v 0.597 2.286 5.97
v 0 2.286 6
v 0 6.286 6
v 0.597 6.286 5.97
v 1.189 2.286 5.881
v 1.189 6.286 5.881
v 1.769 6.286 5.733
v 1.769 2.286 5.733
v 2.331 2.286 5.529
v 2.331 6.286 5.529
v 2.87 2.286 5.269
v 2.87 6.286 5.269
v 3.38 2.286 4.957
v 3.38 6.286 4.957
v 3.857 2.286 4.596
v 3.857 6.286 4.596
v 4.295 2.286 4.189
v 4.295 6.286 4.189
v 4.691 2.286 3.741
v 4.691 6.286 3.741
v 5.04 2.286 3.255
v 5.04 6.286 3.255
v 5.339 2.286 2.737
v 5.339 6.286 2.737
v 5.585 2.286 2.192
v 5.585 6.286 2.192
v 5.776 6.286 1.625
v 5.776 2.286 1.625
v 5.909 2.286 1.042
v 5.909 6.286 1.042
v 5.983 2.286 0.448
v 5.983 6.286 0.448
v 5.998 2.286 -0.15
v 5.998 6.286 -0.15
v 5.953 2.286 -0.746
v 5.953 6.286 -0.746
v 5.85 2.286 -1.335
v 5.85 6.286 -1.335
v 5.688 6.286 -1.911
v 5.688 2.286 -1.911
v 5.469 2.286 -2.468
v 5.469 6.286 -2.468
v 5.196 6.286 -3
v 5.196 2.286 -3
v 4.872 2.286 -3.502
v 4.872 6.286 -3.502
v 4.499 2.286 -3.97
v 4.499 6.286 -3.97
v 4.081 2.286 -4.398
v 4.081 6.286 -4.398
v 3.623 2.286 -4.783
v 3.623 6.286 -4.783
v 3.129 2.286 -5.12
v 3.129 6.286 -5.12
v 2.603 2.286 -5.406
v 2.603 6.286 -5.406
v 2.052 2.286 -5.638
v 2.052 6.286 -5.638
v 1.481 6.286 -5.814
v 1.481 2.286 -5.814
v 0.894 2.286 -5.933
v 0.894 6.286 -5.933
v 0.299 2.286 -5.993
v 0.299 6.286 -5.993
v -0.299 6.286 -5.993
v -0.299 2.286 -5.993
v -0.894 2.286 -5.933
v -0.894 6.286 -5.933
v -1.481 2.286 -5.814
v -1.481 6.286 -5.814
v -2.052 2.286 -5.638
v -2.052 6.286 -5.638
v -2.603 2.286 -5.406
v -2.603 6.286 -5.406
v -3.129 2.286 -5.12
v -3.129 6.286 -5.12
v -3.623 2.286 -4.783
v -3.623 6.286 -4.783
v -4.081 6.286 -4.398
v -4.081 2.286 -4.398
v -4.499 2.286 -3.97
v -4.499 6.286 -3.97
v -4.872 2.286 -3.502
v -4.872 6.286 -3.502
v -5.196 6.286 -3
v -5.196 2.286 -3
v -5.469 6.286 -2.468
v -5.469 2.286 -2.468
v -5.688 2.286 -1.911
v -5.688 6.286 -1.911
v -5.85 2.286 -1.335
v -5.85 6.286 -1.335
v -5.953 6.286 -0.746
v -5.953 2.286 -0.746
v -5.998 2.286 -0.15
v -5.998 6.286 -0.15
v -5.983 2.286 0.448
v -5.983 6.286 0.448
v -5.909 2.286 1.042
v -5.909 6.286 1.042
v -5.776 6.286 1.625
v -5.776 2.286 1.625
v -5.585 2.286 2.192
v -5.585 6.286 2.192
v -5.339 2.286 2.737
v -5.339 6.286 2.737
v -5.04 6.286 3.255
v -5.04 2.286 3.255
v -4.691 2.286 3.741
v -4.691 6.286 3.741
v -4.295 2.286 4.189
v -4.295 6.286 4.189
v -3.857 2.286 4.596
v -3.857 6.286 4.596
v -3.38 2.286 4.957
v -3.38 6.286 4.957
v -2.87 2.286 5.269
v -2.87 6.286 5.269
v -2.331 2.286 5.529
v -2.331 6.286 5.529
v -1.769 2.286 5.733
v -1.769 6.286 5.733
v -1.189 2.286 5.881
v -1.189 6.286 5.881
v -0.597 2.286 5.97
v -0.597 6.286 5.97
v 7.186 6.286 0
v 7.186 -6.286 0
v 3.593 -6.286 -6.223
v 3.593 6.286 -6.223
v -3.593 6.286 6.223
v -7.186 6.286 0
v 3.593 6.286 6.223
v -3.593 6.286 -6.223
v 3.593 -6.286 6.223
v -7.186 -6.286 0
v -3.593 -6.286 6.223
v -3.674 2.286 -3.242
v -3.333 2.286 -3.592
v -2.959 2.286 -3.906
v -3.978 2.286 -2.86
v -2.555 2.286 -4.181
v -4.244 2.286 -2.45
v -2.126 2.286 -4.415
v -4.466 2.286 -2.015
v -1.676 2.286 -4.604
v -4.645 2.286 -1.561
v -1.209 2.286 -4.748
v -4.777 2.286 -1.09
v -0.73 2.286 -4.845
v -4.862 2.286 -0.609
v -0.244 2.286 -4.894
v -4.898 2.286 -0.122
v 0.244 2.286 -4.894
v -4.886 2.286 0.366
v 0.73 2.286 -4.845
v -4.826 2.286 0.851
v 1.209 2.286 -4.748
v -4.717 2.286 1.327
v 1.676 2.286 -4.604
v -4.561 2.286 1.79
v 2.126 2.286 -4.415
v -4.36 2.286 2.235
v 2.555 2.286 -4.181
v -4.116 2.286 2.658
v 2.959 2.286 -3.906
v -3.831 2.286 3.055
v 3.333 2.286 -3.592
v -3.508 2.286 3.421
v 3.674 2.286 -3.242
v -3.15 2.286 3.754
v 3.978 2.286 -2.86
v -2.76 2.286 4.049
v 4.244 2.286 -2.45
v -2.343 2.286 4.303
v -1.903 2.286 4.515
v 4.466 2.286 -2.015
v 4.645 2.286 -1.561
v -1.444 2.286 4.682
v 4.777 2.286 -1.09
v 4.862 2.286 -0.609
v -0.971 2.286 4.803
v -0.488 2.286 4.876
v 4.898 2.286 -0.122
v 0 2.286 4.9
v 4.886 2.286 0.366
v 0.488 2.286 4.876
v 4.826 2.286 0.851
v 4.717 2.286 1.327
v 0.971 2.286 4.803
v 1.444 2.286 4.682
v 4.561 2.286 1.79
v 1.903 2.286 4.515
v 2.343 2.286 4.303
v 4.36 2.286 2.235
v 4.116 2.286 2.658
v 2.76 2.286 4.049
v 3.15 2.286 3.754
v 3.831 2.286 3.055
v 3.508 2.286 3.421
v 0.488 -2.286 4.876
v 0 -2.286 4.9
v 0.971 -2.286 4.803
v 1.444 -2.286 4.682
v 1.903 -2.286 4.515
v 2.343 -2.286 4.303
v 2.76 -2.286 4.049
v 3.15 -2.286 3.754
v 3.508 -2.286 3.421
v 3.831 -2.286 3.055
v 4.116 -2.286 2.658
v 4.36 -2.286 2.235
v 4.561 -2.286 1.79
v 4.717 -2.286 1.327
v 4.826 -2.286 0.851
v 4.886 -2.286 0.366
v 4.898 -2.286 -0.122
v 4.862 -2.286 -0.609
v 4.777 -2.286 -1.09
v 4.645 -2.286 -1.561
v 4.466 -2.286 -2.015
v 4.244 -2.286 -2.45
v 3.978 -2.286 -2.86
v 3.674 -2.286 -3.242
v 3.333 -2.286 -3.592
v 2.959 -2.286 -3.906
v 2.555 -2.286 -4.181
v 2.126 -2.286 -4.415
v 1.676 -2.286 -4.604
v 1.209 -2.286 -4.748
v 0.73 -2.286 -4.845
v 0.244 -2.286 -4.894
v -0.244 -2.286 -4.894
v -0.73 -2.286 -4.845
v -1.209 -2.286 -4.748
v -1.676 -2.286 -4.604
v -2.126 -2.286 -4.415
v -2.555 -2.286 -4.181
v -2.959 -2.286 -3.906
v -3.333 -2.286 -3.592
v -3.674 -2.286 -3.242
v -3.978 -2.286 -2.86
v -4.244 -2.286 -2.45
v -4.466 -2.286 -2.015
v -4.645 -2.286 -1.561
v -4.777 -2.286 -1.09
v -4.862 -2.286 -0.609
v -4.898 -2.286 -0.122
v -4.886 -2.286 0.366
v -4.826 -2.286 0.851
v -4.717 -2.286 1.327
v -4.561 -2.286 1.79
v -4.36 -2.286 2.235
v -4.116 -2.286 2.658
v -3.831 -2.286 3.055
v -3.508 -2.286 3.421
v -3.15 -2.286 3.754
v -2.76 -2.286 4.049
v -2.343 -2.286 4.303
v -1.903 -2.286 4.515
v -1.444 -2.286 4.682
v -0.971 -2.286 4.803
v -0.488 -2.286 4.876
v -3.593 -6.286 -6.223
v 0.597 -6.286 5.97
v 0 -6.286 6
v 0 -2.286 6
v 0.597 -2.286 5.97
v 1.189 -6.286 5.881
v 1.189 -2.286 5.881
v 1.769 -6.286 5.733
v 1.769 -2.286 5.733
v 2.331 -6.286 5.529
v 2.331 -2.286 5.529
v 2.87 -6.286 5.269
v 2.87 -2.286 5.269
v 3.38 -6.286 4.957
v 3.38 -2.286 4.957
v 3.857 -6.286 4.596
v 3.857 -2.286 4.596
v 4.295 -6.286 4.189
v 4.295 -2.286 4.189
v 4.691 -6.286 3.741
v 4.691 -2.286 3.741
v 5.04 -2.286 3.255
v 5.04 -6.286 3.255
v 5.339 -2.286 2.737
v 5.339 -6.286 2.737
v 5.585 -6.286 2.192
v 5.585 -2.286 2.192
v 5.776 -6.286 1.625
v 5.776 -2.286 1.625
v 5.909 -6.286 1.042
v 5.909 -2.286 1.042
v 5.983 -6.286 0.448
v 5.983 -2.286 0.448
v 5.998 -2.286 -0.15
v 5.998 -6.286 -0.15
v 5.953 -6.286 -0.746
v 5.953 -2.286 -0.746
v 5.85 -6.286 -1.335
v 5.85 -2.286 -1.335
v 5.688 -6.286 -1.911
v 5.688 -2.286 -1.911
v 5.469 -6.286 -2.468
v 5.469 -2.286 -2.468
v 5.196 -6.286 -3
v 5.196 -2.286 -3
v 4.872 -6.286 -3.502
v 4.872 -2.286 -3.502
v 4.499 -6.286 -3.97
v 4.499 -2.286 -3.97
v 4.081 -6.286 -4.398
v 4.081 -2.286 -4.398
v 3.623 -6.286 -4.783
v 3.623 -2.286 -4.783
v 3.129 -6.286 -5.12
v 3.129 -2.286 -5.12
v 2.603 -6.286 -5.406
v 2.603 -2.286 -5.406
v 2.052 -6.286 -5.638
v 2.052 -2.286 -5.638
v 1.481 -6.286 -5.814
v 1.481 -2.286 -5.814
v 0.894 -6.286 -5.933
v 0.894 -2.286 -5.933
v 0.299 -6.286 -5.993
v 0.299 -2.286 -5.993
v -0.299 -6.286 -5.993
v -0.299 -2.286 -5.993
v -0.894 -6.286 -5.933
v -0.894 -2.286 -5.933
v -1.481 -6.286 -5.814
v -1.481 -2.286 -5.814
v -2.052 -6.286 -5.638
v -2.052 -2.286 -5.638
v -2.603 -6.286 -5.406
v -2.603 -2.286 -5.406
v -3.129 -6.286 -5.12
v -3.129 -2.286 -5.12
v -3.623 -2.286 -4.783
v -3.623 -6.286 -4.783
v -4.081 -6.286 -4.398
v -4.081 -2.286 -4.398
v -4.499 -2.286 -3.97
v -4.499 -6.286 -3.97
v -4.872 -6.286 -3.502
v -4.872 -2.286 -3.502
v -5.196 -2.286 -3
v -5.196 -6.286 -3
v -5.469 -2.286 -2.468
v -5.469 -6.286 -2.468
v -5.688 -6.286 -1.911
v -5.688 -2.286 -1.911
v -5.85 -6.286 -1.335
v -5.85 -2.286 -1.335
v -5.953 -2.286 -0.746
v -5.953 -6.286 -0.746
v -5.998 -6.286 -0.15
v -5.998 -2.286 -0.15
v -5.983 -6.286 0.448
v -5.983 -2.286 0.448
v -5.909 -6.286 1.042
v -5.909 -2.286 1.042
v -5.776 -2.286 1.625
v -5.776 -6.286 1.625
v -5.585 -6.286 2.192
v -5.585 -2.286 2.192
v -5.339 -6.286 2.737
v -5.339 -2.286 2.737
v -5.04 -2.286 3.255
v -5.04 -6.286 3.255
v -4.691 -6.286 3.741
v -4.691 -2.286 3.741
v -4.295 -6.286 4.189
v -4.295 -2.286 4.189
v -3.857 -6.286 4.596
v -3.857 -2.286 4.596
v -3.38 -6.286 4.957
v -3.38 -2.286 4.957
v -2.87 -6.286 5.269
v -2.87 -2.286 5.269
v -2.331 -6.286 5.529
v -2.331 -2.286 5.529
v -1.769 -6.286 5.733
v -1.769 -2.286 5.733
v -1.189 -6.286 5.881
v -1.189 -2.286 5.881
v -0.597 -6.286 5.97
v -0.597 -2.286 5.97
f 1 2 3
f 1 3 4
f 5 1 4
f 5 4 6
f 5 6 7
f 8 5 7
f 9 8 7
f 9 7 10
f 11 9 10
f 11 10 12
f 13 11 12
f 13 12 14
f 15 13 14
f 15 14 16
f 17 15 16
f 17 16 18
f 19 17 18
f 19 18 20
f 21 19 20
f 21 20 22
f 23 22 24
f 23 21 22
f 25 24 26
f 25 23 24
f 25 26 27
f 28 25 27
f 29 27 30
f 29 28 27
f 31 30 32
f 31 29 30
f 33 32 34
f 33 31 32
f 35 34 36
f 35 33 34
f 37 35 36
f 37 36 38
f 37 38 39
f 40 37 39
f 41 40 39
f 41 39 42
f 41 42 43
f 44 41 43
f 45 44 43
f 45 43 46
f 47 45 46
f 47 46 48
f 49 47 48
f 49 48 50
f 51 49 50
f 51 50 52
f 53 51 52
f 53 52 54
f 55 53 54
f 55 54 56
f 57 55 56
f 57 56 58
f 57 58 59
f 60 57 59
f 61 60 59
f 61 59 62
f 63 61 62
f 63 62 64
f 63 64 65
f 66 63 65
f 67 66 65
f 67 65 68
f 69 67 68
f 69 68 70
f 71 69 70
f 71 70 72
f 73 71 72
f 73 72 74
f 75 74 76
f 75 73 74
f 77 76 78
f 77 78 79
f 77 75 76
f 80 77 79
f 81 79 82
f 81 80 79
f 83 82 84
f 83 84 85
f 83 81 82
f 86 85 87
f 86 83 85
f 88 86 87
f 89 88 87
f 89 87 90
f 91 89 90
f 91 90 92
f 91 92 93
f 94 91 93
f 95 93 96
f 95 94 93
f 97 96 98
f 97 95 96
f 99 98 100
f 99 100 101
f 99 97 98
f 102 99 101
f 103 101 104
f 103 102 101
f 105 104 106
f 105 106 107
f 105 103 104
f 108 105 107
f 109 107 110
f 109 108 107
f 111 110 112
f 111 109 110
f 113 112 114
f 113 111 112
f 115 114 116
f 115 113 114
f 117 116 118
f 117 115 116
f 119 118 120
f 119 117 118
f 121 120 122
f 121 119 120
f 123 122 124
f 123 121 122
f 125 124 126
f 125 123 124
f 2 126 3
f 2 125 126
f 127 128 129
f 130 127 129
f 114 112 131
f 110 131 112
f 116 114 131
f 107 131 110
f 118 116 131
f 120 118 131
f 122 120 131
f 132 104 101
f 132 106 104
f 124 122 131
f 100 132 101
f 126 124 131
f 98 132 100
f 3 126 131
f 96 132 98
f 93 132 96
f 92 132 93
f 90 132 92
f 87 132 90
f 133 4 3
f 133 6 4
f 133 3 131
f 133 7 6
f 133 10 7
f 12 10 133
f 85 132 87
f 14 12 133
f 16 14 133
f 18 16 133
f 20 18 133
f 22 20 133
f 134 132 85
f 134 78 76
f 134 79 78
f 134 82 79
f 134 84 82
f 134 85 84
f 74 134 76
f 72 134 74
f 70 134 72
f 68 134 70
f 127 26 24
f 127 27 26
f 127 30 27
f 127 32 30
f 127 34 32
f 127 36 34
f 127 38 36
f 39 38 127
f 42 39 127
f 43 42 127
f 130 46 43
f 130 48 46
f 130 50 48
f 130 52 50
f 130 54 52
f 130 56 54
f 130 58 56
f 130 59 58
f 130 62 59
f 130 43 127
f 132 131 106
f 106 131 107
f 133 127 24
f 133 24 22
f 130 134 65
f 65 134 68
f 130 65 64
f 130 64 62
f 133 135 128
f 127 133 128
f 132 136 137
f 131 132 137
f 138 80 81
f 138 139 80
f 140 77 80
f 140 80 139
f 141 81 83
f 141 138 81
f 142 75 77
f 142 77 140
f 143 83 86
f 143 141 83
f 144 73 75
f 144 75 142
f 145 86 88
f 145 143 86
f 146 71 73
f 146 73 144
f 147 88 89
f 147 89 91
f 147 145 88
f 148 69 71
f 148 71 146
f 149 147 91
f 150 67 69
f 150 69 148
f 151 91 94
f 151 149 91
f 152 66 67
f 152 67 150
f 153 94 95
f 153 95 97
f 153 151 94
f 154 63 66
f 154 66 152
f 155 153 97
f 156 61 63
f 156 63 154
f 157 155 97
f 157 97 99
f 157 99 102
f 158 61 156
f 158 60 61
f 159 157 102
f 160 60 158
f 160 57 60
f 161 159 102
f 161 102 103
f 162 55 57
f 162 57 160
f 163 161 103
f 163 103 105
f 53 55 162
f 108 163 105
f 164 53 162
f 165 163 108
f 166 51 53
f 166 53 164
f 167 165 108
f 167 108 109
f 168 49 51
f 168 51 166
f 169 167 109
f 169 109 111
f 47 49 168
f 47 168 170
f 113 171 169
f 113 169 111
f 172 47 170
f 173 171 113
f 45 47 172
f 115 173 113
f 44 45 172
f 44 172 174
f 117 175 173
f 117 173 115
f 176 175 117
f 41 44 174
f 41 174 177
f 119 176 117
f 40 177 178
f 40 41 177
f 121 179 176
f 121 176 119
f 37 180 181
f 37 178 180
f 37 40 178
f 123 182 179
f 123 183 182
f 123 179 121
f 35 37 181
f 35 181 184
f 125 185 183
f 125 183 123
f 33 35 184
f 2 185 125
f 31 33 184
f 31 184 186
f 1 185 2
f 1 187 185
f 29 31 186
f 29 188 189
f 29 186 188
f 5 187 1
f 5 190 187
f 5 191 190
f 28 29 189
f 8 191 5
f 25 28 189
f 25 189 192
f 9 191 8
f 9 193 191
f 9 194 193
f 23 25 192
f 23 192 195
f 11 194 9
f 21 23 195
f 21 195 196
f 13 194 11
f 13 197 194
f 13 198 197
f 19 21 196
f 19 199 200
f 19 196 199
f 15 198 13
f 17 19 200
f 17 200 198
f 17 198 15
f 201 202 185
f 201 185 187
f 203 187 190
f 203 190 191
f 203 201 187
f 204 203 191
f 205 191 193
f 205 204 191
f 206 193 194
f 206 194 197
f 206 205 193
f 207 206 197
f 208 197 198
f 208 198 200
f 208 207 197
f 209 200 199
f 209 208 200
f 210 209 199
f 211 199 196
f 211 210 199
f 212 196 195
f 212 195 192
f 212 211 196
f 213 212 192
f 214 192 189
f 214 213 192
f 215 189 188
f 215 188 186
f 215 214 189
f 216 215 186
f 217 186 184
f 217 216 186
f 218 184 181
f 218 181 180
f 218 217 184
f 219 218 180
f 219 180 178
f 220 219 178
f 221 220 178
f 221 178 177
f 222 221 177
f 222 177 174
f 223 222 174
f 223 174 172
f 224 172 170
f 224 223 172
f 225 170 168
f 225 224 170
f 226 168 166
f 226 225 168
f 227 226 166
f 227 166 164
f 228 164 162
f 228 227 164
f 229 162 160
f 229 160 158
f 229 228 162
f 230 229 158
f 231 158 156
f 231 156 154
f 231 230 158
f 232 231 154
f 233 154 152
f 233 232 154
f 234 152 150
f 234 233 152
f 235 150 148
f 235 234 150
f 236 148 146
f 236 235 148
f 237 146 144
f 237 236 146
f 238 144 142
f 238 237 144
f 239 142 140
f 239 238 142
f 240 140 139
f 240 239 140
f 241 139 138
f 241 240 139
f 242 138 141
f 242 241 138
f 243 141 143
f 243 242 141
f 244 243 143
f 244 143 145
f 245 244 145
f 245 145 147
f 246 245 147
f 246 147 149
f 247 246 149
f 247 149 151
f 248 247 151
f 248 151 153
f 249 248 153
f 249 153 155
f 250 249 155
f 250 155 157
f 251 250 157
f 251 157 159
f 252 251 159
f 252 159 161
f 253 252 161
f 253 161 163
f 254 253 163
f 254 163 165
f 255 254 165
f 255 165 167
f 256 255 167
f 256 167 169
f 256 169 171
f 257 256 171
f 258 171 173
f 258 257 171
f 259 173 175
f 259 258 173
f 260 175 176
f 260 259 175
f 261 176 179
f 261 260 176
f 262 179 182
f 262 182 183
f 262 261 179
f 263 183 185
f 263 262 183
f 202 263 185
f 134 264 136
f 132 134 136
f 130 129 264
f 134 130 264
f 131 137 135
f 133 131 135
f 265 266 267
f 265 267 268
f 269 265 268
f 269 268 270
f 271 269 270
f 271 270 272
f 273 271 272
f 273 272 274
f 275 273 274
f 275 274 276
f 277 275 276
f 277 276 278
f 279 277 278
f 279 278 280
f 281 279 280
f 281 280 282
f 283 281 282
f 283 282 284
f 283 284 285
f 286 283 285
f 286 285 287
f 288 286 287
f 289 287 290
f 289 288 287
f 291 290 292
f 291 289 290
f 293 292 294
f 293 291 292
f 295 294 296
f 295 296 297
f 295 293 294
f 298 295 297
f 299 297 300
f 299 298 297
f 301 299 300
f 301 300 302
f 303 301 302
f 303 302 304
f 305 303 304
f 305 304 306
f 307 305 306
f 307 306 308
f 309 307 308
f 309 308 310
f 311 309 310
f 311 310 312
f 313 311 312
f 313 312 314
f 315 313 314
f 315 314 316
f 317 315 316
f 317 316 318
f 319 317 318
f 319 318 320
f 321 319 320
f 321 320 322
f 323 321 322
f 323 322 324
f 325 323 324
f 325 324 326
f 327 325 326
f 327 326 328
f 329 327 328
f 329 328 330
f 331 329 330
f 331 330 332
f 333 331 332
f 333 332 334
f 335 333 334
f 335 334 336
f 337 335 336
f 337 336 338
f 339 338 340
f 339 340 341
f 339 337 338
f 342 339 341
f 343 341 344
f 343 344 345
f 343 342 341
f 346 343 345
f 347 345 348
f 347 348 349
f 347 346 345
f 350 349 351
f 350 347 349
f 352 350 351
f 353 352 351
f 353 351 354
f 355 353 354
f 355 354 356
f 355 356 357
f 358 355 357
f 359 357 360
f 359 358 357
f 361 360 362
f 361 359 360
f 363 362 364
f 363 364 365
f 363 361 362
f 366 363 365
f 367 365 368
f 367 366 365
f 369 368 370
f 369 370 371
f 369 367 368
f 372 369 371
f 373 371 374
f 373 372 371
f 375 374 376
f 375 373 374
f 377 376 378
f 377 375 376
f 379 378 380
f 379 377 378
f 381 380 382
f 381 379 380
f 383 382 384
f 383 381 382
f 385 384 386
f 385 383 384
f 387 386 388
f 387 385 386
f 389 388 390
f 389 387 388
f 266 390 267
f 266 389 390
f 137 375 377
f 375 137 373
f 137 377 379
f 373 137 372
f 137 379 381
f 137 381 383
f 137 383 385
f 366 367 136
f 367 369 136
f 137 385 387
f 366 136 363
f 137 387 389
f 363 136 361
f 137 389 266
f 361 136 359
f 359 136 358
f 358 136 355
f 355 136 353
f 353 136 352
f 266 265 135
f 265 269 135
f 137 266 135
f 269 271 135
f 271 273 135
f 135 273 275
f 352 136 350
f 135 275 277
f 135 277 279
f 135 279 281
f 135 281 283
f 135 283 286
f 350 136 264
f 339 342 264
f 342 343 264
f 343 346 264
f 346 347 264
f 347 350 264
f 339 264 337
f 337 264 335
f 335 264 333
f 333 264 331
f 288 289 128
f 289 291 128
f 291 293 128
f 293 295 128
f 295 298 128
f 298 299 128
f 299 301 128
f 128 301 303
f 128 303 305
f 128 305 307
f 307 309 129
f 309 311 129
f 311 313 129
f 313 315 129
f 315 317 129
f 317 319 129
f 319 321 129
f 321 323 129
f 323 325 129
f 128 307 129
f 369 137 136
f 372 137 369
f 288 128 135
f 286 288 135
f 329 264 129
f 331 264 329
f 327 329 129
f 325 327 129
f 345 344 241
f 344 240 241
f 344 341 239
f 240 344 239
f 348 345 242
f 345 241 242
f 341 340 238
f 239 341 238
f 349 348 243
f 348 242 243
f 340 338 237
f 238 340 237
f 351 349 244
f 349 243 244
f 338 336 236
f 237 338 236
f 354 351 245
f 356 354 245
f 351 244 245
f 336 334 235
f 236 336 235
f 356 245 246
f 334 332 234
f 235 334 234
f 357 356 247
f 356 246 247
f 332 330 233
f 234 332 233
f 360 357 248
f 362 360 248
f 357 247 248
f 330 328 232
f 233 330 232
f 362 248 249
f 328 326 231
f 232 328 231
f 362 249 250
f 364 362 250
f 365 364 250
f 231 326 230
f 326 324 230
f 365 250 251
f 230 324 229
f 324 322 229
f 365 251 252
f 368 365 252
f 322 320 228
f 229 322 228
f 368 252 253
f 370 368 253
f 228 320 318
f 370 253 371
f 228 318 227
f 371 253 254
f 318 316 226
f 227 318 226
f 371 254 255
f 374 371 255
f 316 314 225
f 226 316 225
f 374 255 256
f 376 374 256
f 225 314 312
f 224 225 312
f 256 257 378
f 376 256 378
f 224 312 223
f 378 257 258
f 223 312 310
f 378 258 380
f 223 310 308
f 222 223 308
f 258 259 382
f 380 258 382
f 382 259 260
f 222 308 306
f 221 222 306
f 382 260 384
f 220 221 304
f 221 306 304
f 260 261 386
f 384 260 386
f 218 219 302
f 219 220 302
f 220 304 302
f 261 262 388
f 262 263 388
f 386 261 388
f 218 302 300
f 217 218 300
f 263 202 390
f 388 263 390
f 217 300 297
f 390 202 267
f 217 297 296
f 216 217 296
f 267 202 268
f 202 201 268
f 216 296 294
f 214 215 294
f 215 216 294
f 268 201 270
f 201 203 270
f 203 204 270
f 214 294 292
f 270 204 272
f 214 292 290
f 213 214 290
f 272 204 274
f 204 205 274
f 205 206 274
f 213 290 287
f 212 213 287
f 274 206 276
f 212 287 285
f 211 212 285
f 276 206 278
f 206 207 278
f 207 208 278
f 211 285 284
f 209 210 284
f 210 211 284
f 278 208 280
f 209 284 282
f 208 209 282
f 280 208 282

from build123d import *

# Parameters (mm, degrees)
BOSS_EXTRUDE1_DEPTH      = 6.2865
BOSS_EXTRUDE1_DEPTH_BACK = 6.2865
SKETCH1_R                = 6
BOSS_EXTRUDE2_DEPTH      = 2.2865
BOSS_EXTRUDE2_DEPTH_BACK = 2.2865
SKETCH2_R                = 6
SKETCH2_R_2              = 4.9


with BuildPart() as part:
    # Sketch1 → Boss-Extrude1 (new, two sides: drawn at the far end of the back side and taken through both)
    with BuildSketch(Plane(origin=(0, 0, 0), x_dir=(1, 0, 0), z_dir=(0, 1, 0)).offset(-BOSS_EXTRUDE1_DEPTH_BACK)):
        Polygon((-3.592850725, 6.223), (-7.18570145, 0), (-3.592850725, -6.223), (3.592850725, -6.223), (7.18570145, 0), (3.592850725, 6.223), align=None)
        Circle(SKETCH1_R, mode=Mode.SUBTRACT)
    extrude(amount=BOSS_EXTRUDE1_DEPTH + BOSS_EXTRUDE1_DEPTH_BACK)

    # Sketch2 → Boss-Extrude2 (add, two sides: drawn at the far end of the back side and taken through both)
    with BuildSketch(Plane(origin=(0, 0, 0), x_dir=(1, 0, 0), z_dir=(0, 1, 0)).offset(-BOSS_EXTRUDE2_DEPTH_BACK)):
        Circle(SKETCH2_R)
        Circle(SKETCH2_R_2, mode=Mode.SUBTRACT)
    extrude(amount=BOSS_EXTRUDE2_DEPTH + BOSS_EXTRUDE2_DEPTH_BACK)


solid = part.part
